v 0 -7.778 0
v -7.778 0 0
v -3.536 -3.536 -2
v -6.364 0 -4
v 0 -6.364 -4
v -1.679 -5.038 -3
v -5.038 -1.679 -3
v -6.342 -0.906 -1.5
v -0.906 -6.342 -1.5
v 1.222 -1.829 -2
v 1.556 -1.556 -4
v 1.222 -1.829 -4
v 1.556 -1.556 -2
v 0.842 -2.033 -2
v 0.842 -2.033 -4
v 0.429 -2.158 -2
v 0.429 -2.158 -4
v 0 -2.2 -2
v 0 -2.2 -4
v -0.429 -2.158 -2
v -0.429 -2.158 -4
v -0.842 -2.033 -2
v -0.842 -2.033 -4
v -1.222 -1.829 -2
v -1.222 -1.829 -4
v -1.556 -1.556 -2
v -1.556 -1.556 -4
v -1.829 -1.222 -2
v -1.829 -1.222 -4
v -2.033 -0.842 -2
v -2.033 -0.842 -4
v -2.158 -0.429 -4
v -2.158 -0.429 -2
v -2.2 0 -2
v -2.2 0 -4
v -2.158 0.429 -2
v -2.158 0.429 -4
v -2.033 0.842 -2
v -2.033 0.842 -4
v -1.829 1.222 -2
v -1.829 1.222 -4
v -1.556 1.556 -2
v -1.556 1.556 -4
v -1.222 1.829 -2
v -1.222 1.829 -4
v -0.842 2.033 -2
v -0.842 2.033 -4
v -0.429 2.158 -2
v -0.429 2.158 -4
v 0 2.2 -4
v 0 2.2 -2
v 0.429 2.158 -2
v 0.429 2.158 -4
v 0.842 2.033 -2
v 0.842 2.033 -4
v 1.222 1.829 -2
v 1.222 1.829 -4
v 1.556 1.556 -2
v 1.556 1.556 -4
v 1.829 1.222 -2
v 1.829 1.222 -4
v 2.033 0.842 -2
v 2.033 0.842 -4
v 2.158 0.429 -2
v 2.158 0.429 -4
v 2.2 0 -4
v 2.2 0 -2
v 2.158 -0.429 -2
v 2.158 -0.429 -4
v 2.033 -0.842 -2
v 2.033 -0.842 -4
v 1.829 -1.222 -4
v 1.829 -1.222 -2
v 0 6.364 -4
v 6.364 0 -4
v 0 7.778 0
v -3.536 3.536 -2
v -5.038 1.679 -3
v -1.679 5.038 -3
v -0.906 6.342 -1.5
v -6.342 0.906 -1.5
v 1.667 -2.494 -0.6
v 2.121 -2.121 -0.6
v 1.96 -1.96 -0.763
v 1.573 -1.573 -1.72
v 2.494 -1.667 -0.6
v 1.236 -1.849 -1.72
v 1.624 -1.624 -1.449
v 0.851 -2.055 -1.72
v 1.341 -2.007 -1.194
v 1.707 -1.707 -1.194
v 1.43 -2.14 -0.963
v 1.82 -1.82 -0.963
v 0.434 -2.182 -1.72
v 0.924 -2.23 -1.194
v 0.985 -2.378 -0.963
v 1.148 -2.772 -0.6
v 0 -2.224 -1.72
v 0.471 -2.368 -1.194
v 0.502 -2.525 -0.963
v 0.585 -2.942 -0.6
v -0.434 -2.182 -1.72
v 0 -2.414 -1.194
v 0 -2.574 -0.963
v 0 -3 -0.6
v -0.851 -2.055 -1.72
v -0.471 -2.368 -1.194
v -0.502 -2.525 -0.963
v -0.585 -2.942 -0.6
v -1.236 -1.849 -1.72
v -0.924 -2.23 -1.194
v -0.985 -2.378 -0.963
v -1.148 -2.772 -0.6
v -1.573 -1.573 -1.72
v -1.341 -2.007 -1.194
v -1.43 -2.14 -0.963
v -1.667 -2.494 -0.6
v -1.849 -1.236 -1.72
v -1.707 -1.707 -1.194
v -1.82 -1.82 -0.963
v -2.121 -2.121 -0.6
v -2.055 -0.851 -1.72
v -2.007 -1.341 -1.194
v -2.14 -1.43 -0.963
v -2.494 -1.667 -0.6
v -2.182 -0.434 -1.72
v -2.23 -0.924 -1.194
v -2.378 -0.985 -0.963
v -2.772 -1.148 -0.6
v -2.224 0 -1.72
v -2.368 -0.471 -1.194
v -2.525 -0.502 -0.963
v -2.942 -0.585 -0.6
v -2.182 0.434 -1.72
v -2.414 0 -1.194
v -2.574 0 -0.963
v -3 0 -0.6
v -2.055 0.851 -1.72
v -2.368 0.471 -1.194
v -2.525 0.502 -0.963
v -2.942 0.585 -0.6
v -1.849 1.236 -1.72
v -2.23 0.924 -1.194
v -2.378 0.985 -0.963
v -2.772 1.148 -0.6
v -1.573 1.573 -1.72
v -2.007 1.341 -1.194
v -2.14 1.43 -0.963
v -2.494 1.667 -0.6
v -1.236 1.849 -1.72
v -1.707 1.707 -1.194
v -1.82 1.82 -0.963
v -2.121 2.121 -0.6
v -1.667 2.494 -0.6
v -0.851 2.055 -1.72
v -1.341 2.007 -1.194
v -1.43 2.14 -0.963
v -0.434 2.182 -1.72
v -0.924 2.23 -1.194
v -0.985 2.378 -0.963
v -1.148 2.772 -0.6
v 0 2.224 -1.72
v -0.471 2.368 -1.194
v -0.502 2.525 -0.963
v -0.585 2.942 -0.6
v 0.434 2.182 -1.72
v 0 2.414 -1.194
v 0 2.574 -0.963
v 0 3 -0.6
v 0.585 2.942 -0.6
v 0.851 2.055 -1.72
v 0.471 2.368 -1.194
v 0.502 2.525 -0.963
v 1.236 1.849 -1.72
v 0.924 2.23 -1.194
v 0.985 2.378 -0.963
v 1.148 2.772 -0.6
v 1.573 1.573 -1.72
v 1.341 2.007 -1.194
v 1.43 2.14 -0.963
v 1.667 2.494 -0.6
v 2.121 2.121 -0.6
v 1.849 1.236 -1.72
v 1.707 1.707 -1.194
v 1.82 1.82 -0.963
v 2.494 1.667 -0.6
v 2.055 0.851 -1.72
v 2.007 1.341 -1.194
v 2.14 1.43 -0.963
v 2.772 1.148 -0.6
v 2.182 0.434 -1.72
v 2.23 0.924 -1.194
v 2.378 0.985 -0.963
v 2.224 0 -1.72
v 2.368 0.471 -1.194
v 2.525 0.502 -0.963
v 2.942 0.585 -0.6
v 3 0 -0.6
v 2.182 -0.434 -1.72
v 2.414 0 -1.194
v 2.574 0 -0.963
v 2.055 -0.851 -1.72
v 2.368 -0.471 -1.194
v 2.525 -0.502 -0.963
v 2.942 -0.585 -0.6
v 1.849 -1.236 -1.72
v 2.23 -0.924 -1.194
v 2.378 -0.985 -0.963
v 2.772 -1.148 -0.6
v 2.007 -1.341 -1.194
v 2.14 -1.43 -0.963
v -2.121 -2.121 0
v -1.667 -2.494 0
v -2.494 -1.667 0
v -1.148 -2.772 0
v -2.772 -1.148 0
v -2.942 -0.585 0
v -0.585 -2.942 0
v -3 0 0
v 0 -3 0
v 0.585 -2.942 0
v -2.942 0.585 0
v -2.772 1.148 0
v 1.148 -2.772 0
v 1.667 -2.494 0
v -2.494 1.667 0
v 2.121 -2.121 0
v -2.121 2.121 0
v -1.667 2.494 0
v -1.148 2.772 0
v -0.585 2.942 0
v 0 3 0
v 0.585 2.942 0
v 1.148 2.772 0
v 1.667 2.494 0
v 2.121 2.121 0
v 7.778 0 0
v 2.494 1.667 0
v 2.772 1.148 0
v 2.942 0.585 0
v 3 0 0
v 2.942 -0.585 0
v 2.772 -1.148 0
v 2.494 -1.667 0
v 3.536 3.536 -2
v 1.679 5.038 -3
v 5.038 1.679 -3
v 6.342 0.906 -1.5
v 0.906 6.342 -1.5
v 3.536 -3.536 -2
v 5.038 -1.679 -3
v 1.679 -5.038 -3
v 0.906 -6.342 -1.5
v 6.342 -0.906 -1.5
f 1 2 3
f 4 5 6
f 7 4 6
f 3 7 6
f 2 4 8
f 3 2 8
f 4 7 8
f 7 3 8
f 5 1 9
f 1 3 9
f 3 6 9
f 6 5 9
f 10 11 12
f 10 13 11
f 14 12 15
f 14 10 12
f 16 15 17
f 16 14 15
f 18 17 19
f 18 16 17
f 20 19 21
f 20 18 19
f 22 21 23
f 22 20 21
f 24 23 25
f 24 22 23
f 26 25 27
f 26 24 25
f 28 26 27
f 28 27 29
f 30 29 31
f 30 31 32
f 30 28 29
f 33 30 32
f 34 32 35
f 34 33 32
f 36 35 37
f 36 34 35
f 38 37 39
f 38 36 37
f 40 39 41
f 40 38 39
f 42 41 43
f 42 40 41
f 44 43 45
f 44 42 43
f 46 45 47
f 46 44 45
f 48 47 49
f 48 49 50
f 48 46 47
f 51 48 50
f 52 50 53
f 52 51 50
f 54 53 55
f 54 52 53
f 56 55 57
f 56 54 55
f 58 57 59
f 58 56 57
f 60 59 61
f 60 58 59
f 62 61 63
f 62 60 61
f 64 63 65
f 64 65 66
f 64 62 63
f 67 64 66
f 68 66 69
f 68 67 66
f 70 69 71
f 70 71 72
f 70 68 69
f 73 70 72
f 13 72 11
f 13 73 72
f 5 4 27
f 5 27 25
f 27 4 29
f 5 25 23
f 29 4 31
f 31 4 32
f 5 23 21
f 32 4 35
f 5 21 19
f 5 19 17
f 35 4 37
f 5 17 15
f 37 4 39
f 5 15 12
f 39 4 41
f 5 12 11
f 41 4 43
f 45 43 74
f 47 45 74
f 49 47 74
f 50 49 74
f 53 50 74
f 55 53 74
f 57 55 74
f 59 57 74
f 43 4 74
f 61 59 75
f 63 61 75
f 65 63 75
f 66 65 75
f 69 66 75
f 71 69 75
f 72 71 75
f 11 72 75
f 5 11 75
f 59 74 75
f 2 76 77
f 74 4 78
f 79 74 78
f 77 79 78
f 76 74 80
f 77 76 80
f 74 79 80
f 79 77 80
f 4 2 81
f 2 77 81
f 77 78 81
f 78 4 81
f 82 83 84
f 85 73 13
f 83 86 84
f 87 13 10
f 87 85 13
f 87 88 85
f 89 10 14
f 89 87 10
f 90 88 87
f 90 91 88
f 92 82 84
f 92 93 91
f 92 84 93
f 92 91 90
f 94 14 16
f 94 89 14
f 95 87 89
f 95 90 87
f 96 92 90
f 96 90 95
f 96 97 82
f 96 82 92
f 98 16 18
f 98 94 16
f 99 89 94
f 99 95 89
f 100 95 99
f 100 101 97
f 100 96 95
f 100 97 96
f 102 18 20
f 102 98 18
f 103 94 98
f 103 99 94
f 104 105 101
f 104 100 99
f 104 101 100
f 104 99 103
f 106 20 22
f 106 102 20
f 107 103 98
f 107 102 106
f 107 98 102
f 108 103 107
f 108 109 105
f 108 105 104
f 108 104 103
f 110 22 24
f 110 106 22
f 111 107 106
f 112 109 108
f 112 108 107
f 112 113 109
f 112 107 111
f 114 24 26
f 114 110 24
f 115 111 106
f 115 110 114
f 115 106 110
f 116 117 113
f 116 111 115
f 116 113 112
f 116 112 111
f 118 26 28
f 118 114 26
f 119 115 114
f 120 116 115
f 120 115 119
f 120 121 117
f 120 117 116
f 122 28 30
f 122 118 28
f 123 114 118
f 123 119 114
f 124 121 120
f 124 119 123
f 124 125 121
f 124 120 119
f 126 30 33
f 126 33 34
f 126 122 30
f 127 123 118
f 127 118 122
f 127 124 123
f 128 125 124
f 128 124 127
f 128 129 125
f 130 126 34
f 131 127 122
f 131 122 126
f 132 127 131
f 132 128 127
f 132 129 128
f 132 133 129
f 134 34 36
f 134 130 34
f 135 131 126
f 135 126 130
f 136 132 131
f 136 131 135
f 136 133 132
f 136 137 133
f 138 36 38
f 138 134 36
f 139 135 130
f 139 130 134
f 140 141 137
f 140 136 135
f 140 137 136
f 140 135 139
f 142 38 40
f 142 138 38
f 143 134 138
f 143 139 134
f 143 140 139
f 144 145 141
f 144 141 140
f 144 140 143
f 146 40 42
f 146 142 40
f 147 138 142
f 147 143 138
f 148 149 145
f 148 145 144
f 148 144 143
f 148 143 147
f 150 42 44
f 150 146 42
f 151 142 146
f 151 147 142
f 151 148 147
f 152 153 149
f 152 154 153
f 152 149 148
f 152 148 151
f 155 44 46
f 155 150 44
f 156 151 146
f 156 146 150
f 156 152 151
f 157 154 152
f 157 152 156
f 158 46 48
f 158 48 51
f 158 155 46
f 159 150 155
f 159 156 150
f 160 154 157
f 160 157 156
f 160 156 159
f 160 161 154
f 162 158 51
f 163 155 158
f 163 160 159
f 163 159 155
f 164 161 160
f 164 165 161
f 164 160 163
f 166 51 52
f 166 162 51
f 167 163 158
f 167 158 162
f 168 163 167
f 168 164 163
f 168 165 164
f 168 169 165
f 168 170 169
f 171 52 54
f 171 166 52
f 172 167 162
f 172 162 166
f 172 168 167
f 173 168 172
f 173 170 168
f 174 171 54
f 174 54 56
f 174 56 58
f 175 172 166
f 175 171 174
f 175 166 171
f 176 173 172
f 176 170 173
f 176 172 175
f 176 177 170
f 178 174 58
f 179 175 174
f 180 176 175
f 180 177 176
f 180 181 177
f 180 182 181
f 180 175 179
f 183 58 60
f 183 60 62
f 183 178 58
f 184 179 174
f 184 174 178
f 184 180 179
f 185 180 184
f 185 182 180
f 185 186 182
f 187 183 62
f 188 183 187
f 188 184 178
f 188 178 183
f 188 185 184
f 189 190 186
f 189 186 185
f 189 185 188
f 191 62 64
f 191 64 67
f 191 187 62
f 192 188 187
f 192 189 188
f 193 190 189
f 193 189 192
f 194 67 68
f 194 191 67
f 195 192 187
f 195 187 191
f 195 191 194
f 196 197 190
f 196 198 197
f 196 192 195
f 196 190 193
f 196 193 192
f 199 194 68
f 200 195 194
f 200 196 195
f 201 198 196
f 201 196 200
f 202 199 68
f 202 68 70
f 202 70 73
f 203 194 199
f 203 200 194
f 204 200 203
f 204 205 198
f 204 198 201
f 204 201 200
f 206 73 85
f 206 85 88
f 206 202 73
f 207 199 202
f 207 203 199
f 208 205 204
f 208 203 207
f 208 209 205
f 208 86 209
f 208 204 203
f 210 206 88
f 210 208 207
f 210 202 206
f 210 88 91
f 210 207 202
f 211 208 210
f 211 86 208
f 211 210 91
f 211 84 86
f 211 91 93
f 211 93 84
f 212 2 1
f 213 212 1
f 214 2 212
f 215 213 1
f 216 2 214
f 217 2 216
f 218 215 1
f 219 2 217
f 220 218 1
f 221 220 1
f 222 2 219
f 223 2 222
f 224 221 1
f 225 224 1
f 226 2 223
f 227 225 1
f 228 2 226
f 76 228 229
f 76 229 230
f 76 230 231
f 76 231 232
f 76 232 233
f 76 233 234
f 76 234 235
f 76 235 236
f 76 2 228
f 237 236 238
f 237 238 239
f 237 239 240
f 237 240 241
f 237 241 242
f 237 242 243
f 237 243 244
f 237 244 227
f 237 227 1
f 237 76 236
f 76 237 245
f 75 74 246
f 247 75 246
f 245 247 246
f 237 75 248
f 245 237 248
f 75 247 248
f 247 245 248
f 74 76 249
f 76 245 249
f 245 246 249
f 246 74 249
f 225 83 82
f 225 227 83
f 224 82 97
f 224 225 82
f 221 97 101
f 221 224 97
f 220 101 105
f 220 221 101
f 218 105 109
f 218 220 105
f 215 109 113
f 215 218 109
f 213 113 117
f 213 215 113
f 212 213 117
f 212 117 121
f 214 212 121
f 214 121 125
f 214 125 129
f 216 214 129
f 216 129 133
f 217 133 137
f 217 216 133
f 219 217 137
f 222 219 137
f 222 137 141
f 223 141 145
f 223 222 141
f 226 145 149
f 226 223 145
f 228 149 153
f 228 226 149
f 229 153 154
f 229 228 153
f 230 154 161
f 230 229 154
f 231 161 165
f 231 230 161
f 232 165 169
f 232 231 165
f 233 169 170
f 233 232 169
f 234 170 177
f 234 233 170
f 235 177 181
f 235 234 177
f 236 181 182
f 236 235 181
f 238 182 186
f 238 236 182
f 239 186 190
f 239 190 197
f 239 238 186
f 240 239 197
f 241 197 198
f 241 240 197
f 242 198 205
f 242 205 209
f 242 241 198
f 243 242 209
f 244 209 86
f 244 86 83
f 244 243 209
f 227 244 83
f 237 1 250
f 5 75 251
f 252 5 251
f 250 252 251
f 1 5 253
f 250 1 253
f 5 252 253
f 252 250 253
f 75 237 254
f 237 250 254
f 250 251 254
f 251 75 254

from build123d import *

# Parameters (mm, degrees)
F0_W     = 11
F0_H     = 11
F2_W     = 9
F2_H     = 9
F6_ANGLE = 45


with BuildPart() as f3:
    # F0 (on Top) → F3 section 0
    with BuildSketch(Plane.XY):
        Rectangle(F0_W, F0_H)
    # F2 (on offset) → F3 section 1
    with BuildSketch(Plane.XY.offset(-4)):
        Rectangle(F2_W, F2_H)
    loft()

    # F4 (on Front) → F5 (revolve, cut)
    with BuildSketch(Plane.XZ):
        with BuildLine():
            Line((0, -4), (2.2, -4))
            Line((2.2, -4), (2.2, -2))
            ThreePointArc((2.2, -2), (2.414105, -1.193774), (3, -0.6))
            Line((3, -0.6), (3, 0))
            Line((3, 0), (0, 0))
            Line((0, 0), (0, -4))
        make_face()
    revolve(axis=Axis((0, 0, -1.994932), (0, 0, -1)), mode=Mode.SUBTRACT)


with BuildPart() as f3_1:
    # F6: moved
    add(f3.part.rotate(Axis((0, 0, -2), (0, 0, -1)), F6_ANGLE))


solid = f3_1.part
